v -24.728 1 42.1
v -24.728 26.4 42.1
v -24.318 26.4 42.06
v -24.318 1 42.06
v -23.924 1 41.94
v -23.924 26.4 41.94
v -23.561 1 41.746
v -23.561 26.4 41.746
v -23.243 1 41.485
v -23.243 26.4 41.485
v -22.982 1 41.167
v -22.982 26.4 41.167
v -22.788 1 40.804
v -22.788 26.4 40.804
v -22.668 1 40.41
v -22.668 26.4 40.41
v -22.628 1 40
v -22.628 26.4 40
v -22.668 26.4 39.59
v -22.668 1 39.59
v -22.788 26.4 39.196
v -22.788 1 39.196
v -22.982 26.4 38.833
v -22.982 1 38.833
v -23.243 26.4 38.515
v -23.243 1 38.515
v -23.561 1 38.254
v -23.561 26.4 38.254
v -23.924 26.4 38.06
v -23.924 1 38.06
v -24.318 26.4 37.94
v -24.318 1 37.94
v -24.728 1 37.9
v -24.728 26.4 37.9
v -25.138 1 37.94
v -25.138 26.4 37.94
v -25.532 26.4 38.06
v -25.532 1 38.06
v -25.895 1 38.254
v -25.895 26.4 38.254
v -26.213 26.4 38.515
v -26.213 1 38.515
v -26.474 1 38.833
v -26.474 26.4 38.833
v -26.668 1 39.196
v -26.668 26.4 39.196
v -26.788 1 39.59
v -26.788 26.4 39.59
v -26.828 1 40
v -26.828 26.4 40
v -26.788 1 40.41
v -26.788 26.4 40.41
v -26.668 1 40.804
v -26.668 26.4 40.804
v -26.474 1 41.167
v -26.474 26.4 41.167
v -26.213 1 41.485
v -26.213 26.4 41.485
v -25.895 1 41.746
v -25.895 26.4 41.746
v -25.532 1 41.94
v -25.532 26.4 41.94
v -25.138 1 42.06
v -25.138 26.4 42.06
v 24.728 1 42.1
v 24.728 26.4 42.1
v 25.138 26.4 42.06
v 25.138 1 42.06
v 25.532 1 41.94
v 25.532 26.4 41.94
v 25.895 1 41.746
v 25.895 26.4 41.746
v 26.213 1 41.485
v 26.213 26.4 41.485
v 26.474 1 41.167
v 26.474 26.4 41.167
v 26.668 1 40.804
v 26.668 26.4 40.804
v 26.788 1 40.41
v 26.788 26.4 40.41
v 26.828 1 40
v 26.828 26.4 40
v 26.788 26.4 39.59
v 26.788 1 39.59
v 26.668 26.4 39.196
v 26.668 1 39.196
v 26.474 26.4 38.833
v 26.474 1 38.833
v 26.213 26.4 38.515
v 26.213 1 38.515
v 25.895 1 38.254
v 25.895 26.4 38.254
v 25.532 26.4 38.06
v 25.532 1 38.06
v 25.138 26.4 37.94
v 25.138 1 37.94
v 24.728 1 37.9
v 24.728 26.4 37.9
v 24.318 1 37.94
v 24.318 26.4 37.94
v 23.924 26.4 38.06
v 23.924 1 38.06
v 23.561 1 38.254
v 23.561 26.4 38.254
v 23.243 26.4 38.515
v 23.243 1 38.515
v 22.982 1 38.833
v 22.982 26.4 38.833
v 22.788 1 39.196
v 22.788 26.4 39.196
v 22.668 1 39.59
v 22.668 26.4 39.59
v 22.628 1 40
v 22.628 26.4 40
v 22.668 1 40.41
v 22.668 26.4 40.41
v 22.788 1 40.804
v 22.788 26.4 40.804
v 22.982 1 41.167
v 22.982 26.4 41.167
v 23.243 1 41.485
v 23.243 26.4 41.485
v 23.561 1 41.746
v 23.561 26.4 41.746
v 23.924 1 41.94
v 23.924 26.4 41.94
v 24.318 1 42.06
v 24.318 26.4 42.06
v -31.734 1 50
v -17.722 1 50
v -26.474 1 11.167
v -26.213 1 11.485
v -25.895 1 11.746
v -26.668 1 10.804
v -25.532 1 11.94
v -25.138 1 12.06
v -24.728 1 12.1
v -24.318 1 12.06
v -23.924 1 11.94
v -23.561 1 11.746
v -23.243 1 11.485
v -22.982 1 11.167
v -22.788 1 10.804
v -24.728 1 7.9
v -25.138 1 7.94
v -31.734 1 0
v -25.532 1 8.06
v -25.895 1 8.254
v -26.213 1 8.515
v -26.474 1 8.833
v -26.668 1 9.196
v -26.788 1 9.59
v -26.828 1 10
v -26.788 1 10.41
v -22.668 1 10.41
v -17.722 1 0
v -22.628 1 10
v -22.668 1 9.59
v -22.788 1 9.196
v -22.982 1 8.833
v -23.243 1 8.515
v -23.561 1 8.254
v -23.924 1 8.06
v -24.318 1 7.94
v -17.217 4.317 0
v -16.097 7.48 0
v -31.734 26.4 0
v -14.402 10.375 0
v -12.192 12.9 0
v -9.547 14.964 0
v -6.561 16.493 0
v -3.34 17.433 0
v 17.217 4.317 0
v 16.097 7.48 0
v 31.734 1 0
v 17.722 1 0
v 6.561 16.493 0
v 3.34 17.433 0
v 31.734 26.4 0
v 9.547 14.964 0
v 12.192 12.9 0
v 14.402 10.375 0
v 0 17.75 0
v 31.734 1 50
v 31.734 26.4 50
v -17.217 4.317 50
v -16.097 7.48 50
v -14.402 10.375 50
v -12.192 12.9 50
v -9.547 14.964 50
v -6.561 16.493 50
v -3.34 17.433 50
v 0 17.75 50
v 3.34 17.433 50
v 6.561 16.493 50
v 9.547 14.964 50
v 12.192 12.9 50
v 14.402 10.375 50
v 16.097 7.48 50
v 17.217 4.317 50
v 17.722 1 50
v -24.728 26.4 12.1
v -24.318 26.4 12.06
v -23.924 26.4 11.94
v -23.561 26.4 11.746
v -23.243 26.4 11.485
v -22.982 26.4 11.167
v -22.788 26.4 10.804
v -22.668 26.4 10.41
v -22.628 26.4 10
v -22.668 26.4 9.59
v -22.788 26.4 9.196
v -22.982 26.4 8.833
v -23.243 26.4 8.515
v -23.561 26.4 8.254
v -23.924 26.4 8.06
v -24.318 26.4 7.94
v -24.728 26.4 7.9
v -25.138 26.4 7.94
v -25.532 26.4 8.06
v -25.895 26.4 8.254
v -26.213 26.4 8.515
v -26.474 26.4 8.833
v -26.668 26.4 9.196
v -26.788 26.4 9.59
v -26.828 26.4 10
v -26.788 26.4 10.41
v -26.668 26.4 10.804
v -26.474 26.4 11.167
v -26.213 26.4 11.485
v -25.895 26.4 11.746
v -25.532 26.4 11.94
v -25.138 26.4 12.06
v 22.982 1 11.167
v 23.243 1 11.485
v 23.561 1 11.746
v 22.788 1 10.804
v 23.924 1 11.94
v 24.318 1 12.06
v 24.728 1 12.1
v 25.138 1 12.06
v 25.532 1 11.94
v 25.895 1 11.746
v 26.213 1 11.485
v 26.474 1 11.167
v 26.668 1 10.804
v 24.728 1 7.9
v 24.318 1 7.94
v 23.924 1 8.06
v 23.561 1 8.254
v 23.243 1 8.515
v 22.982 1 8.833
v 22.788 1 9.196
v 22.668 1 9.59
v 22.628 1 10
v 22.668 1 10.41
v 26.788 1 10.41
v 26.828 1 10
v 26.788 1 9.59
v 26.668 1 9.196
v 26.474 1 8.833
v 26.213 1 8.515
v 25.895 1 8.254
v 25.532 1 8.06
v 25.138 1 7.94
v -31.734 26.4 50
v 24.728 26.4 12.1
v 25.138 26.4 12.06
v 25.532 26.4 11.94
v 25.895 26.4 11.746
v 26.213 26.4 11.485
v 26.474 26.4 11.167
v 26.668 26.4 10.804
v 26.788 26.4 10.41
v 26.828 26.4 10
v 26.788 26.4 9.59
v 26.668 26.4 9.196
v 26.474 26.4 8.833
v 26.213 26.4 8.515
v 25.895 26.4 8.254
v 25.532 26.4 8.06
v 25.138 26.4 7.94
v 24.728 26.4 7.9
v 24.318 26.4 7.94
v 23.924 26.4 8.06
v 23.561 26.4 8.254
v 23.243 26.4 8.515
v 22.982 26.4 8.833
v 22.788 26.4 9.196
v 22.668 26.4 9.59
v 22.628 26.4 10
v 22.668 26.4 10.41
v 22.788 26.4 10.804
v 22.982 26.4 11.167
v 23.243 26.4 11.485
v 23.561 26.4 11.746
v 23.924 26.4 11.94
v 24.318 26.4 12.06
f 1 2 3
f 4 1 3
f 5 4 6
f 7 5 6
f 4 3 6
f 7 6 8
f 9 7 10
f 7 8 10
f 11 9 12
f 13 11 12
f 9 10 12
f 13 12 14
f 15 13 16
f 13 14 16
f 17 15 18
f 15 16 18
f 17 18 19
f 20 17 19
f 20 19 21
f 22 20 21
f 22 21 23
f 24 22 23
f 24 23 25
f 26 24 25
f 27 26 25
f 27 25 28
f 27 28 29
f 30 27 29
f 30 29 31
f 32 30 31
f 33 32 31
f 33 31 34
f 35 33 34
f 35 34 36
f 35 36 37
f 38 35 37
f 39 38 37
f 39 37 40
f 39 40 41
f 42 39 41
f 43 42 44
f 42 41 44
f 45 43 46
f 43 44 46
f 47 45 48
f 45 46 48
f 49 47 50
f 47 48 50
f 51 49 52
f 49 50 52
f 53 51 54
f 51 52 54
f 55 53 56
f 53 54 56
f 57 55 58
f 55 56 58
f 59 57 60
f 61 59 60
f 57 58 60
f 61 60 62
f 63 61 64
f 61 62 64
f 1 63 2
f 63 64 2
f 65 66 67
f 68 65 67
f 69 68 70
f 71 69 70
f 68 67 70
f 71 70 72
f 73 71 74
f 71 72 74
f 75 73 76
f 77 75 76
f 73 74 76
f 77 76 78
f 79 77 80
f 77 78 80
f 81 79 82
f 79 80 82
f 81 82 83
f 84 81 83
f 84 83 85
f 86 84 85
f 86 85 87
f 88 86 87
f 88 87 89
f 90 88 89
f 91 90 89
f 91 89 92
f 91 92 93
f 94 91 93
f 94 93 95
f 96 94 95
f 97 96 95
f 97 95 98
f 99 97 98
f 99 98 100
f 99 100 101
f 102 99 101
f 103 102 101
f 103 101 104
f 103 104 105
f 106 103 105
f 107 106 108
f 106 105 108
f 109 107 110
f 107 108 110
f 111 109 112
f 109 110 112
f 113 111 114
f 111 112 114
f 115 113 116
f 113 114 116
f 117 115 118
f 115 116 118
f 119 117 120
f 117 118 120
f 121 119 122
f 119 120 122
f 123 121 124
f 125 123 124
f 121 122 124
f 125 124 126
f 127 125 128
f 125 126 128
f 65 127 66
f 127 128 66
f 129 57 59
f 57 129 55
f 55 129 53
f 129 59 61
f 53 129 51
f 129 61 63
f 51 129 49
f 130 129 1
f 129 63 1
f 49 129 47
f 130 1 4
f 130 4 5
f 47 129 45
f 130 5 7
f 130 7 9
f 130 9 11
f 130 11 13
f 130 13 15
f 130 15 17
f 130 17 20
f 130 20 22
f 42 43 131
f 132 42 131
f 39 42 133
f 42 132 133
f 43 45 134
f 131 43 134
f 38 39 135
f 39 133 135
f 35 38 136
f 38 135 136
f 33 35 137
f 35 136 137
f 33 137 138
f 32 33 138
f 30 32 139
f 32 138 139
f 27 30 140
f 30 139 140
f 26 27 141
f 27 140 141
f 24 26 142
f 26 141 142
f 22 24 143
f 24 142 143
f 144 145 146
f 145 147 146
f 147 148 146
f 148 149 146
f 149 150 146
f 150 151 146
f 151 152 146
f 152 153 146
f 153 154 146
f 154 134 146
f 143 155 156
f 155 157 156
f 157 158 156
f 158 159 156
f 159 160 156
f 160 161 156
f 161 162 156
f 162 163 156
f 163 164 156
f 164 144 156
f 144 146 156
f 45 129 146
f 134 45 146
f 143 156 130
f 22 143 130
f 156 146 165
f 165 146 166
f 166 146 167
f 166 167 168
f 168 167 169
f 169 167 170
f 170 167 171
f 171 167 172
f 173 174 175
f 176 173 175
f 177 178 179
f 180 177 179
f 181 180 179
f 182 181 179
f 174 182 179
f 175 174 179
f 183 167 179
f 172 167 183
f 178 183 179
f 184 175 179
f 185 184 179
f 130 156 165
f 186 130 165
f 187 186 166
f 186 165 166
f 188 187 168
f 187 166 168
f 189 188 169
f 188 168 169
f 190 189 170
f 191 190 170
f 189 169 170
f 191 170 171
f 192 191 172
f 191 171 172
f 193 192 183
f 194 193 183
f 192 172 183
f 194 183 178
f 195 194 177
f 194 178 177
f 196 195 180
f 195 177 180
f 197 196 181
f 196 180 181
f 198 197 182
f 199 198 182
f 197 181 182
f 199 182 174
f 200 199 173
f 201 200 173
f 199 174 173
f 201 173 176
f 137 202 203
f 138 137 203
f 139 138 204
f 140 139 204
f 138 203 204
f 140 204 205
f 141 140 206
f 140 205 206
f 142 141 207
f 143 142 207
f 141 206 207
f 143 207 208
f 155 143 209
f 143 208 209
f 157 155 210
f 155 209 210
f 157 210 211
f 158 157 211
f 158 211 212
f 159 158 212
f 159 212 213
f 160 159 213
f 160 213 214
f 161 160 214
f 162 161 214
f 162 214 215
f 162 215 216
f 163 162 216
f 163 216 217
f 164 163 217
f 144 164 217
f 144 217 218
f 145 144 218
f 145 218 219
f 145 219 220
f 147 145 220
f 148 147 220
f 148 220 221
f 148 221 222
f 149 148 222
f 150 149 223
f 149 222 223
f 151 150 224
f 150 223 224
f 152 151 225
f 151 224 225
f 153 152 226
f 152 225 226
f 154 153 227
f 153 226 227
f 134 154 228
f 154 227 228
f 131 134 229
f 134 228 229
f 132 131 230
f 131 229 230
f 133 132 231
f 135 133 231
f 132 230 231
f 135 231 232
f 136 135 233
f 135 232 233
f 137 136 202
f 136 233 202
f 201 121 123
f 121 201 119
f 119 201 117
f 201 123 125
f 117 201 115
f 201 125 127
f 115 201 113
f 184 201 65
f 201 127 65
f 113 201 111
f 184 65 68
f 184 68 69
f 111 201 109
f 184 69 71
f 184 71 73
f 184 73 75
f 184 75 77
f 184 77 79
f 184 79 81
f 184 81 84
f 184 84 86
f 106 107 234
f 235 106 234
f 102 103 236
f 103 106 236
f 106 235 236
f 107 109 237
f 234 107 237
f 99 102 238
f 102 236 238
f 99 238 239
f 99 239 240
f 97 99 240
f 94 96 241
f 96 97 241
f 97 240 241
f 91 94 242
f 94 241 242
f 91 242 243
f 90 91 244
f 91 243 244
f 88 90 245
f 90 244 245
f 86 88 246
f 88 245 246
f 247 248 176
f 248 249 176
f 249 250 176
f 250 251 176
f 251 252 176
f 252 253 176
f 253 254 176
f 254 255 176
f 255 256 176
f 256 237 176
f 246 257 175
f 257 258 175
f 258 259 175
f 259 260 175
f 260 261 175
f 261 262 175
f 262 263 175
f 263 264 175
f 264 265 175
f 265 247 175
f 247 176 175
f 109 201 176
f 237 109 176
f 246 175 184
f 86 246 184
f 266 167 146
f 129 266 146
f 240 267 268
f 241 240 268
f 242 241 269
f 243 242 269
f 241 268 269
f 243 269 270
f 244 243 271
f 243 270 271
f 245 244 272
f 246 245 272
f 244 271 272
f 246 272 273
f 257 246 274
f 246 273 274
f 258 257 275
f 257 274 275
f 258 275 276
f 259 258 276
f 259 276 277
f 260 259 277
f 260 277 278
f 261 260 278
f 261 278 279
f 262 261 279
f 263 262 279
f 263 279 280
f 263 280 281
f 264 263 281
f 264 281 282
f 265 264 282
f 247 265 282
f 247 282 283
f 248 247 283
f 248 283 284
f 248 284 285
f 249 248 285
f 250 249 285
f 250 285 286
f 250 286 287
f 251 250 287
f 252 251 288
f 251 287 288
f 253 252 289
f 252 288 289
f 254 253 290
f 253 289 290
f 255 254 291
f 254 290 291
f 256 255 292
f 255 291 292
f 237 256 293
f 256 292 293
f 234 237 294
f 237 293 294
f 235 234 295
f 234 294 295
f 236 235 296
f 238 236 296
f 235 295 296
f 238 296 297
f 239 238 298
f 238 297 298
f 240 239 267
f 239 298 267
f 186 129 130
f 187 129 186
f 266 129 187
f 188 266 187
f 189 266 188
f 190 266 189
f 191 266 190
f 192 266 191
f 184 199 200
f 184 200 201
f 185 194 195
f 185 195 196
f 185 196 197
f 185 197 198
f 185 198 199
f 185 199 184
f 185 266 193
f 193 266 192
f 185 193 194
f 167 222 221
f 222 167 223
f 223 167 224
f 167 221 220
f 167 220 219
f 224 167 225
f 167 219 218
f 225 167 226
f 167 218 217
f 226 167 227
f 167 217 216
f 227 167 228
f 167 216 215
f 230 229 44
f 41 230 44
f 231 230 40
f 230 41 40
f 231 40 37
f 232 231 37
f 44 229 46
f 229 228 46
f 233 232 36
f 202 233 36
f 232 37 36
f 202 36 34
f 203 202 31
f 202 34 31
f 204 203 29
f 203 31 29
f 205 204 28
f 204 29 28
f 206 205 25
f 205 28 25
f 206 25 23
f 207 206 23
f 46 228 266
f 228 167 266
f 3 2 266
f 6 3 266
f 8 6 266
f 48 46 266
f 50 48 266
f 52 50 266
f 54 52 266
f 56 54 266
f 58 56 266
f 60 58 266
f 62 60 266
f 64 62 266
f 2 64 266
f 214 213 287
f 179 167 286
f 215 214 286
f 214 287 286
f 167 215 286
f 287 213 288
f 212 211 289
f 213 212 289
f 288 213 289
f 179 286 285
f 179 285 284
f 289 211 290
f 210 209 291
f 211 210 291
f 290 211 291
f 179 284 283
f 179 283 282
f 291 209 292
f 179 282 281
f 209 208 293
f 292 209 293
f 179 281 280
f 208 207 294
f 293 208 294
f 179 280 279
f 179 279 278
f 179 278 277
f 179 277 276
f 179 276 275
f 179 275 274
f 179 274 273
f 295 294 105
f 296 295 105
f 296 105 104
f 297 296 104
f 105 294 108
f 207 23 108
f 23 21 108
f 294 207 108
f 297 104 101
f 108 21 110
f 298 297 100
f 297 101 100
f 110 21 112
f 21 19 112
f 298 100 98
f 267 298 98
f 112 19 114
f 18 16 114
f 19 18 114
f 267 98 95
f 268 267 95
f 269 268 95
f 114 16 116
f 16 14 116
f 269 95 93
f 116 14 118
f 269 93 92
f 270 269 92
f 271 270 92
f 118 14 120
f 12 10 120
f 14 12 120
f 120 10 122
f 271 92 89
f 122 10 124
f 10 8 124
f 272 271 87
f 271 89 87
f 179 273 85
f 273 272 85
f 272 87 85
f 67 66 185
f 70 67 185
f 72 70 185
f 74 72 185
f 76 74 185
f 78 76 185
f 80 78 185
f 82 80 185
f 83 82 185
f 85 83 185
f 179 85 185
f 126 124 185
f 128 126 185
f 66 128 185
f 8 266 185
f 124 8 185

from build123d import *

# Parameters (mm, degrees)
BOSS_EXTRUDE1_DEPTH         = 50
BOSS_EXTRUDE2_START         = -50
BOSS_EXTRUDE2_DEPTH         = 50
TAP_DRILL_FOR_M5X0_8_TAP1_D = 4.2
CUT_EXTRUDE1_REACH          = 69.195
SKETCH5_W                   = 63.468496122
SKETCH5_H                   = 5.35


with BuildPart() as part:
    # Sketch1 → Boss-Extrude1 (new body)
    with BuildSketch(Plane.XY):
        with BuildLine():
            Line((-31.734248061, 1), (-17.721808598, 1))
            ThreePointArc((-17.721808598, 1), (0, 17.75), (17.721808598, 1))
            Line((17.721808598, 1), (31.734248061, 1))
            ThreePointArc((31.734248061, 1), (0, 31.75), (-31.734248061, 1))
        make_face()
    extrude(amount=BOSS_EXTRUDE1_DEPTH)

    # Sketch4 → Boss-Extrude2 (add)
    with BuildSketch(Plane.XY.offset(50).offset(BOSS_EXTRUDE2_START)):
        with BuildLine():
            Line((31.734248061, 31.75), (0, 31.75))
            ThreePointArc((0, 31.75), (22.094258304, 22.801452805), (31.734248061, 1))
            Line((31.734248061, 1), (31.734248061, 31.75))
        make_face()
        with BuildLine():
            ThreePointArc((-31.734248061, 1), (-22.094258304, 22.801452805), (0, 31.75))
            Line((0, 31.75), (-31.734248061, 31.75))
            Line((-31.734248061, 31.75), (-31.734248061, 1))
        make_face()
    extrude(amount=BOSS_EXTRUDE2_DEPTH)

    # Tap Drill for M5x0.8 Tap1 (through all)
    with Locations(Plane(origin=(-24.72802833, 1, 40), x_dir=(0, 0, -1), z_dir=(0, -1, 0))):
        with Locations((0, 0), (30, 0), (0, 49.45605666), (30, 49.45605666)):
            Hole(TAP_DRILL_FOR_M5X0_8_TAP1_D / 2)

    # Sketch5 → Cut-Extrude1 (cut, up to next)
    with BuildSketch(Plane.XY.offset(50), mode=Mode.PRIVATE) as cut_extrude1_sk1:
        with Locations((0, 29.075)):
            Rectangle(SKETCH5_W, SKETCH5_H)
    cut_extrude1_tool1 = extrude(cut_extrude1_sk1.sketch, amount=-CUT_EXTRUDE1_REACH, mode=Mode.PRIVATE) & part.part
    add(cut_extrude1_tool1.solids().sort_by_distance((0, 29.075, 50))[0], mode=Mode.SUBTRACT)


solid = part.part
